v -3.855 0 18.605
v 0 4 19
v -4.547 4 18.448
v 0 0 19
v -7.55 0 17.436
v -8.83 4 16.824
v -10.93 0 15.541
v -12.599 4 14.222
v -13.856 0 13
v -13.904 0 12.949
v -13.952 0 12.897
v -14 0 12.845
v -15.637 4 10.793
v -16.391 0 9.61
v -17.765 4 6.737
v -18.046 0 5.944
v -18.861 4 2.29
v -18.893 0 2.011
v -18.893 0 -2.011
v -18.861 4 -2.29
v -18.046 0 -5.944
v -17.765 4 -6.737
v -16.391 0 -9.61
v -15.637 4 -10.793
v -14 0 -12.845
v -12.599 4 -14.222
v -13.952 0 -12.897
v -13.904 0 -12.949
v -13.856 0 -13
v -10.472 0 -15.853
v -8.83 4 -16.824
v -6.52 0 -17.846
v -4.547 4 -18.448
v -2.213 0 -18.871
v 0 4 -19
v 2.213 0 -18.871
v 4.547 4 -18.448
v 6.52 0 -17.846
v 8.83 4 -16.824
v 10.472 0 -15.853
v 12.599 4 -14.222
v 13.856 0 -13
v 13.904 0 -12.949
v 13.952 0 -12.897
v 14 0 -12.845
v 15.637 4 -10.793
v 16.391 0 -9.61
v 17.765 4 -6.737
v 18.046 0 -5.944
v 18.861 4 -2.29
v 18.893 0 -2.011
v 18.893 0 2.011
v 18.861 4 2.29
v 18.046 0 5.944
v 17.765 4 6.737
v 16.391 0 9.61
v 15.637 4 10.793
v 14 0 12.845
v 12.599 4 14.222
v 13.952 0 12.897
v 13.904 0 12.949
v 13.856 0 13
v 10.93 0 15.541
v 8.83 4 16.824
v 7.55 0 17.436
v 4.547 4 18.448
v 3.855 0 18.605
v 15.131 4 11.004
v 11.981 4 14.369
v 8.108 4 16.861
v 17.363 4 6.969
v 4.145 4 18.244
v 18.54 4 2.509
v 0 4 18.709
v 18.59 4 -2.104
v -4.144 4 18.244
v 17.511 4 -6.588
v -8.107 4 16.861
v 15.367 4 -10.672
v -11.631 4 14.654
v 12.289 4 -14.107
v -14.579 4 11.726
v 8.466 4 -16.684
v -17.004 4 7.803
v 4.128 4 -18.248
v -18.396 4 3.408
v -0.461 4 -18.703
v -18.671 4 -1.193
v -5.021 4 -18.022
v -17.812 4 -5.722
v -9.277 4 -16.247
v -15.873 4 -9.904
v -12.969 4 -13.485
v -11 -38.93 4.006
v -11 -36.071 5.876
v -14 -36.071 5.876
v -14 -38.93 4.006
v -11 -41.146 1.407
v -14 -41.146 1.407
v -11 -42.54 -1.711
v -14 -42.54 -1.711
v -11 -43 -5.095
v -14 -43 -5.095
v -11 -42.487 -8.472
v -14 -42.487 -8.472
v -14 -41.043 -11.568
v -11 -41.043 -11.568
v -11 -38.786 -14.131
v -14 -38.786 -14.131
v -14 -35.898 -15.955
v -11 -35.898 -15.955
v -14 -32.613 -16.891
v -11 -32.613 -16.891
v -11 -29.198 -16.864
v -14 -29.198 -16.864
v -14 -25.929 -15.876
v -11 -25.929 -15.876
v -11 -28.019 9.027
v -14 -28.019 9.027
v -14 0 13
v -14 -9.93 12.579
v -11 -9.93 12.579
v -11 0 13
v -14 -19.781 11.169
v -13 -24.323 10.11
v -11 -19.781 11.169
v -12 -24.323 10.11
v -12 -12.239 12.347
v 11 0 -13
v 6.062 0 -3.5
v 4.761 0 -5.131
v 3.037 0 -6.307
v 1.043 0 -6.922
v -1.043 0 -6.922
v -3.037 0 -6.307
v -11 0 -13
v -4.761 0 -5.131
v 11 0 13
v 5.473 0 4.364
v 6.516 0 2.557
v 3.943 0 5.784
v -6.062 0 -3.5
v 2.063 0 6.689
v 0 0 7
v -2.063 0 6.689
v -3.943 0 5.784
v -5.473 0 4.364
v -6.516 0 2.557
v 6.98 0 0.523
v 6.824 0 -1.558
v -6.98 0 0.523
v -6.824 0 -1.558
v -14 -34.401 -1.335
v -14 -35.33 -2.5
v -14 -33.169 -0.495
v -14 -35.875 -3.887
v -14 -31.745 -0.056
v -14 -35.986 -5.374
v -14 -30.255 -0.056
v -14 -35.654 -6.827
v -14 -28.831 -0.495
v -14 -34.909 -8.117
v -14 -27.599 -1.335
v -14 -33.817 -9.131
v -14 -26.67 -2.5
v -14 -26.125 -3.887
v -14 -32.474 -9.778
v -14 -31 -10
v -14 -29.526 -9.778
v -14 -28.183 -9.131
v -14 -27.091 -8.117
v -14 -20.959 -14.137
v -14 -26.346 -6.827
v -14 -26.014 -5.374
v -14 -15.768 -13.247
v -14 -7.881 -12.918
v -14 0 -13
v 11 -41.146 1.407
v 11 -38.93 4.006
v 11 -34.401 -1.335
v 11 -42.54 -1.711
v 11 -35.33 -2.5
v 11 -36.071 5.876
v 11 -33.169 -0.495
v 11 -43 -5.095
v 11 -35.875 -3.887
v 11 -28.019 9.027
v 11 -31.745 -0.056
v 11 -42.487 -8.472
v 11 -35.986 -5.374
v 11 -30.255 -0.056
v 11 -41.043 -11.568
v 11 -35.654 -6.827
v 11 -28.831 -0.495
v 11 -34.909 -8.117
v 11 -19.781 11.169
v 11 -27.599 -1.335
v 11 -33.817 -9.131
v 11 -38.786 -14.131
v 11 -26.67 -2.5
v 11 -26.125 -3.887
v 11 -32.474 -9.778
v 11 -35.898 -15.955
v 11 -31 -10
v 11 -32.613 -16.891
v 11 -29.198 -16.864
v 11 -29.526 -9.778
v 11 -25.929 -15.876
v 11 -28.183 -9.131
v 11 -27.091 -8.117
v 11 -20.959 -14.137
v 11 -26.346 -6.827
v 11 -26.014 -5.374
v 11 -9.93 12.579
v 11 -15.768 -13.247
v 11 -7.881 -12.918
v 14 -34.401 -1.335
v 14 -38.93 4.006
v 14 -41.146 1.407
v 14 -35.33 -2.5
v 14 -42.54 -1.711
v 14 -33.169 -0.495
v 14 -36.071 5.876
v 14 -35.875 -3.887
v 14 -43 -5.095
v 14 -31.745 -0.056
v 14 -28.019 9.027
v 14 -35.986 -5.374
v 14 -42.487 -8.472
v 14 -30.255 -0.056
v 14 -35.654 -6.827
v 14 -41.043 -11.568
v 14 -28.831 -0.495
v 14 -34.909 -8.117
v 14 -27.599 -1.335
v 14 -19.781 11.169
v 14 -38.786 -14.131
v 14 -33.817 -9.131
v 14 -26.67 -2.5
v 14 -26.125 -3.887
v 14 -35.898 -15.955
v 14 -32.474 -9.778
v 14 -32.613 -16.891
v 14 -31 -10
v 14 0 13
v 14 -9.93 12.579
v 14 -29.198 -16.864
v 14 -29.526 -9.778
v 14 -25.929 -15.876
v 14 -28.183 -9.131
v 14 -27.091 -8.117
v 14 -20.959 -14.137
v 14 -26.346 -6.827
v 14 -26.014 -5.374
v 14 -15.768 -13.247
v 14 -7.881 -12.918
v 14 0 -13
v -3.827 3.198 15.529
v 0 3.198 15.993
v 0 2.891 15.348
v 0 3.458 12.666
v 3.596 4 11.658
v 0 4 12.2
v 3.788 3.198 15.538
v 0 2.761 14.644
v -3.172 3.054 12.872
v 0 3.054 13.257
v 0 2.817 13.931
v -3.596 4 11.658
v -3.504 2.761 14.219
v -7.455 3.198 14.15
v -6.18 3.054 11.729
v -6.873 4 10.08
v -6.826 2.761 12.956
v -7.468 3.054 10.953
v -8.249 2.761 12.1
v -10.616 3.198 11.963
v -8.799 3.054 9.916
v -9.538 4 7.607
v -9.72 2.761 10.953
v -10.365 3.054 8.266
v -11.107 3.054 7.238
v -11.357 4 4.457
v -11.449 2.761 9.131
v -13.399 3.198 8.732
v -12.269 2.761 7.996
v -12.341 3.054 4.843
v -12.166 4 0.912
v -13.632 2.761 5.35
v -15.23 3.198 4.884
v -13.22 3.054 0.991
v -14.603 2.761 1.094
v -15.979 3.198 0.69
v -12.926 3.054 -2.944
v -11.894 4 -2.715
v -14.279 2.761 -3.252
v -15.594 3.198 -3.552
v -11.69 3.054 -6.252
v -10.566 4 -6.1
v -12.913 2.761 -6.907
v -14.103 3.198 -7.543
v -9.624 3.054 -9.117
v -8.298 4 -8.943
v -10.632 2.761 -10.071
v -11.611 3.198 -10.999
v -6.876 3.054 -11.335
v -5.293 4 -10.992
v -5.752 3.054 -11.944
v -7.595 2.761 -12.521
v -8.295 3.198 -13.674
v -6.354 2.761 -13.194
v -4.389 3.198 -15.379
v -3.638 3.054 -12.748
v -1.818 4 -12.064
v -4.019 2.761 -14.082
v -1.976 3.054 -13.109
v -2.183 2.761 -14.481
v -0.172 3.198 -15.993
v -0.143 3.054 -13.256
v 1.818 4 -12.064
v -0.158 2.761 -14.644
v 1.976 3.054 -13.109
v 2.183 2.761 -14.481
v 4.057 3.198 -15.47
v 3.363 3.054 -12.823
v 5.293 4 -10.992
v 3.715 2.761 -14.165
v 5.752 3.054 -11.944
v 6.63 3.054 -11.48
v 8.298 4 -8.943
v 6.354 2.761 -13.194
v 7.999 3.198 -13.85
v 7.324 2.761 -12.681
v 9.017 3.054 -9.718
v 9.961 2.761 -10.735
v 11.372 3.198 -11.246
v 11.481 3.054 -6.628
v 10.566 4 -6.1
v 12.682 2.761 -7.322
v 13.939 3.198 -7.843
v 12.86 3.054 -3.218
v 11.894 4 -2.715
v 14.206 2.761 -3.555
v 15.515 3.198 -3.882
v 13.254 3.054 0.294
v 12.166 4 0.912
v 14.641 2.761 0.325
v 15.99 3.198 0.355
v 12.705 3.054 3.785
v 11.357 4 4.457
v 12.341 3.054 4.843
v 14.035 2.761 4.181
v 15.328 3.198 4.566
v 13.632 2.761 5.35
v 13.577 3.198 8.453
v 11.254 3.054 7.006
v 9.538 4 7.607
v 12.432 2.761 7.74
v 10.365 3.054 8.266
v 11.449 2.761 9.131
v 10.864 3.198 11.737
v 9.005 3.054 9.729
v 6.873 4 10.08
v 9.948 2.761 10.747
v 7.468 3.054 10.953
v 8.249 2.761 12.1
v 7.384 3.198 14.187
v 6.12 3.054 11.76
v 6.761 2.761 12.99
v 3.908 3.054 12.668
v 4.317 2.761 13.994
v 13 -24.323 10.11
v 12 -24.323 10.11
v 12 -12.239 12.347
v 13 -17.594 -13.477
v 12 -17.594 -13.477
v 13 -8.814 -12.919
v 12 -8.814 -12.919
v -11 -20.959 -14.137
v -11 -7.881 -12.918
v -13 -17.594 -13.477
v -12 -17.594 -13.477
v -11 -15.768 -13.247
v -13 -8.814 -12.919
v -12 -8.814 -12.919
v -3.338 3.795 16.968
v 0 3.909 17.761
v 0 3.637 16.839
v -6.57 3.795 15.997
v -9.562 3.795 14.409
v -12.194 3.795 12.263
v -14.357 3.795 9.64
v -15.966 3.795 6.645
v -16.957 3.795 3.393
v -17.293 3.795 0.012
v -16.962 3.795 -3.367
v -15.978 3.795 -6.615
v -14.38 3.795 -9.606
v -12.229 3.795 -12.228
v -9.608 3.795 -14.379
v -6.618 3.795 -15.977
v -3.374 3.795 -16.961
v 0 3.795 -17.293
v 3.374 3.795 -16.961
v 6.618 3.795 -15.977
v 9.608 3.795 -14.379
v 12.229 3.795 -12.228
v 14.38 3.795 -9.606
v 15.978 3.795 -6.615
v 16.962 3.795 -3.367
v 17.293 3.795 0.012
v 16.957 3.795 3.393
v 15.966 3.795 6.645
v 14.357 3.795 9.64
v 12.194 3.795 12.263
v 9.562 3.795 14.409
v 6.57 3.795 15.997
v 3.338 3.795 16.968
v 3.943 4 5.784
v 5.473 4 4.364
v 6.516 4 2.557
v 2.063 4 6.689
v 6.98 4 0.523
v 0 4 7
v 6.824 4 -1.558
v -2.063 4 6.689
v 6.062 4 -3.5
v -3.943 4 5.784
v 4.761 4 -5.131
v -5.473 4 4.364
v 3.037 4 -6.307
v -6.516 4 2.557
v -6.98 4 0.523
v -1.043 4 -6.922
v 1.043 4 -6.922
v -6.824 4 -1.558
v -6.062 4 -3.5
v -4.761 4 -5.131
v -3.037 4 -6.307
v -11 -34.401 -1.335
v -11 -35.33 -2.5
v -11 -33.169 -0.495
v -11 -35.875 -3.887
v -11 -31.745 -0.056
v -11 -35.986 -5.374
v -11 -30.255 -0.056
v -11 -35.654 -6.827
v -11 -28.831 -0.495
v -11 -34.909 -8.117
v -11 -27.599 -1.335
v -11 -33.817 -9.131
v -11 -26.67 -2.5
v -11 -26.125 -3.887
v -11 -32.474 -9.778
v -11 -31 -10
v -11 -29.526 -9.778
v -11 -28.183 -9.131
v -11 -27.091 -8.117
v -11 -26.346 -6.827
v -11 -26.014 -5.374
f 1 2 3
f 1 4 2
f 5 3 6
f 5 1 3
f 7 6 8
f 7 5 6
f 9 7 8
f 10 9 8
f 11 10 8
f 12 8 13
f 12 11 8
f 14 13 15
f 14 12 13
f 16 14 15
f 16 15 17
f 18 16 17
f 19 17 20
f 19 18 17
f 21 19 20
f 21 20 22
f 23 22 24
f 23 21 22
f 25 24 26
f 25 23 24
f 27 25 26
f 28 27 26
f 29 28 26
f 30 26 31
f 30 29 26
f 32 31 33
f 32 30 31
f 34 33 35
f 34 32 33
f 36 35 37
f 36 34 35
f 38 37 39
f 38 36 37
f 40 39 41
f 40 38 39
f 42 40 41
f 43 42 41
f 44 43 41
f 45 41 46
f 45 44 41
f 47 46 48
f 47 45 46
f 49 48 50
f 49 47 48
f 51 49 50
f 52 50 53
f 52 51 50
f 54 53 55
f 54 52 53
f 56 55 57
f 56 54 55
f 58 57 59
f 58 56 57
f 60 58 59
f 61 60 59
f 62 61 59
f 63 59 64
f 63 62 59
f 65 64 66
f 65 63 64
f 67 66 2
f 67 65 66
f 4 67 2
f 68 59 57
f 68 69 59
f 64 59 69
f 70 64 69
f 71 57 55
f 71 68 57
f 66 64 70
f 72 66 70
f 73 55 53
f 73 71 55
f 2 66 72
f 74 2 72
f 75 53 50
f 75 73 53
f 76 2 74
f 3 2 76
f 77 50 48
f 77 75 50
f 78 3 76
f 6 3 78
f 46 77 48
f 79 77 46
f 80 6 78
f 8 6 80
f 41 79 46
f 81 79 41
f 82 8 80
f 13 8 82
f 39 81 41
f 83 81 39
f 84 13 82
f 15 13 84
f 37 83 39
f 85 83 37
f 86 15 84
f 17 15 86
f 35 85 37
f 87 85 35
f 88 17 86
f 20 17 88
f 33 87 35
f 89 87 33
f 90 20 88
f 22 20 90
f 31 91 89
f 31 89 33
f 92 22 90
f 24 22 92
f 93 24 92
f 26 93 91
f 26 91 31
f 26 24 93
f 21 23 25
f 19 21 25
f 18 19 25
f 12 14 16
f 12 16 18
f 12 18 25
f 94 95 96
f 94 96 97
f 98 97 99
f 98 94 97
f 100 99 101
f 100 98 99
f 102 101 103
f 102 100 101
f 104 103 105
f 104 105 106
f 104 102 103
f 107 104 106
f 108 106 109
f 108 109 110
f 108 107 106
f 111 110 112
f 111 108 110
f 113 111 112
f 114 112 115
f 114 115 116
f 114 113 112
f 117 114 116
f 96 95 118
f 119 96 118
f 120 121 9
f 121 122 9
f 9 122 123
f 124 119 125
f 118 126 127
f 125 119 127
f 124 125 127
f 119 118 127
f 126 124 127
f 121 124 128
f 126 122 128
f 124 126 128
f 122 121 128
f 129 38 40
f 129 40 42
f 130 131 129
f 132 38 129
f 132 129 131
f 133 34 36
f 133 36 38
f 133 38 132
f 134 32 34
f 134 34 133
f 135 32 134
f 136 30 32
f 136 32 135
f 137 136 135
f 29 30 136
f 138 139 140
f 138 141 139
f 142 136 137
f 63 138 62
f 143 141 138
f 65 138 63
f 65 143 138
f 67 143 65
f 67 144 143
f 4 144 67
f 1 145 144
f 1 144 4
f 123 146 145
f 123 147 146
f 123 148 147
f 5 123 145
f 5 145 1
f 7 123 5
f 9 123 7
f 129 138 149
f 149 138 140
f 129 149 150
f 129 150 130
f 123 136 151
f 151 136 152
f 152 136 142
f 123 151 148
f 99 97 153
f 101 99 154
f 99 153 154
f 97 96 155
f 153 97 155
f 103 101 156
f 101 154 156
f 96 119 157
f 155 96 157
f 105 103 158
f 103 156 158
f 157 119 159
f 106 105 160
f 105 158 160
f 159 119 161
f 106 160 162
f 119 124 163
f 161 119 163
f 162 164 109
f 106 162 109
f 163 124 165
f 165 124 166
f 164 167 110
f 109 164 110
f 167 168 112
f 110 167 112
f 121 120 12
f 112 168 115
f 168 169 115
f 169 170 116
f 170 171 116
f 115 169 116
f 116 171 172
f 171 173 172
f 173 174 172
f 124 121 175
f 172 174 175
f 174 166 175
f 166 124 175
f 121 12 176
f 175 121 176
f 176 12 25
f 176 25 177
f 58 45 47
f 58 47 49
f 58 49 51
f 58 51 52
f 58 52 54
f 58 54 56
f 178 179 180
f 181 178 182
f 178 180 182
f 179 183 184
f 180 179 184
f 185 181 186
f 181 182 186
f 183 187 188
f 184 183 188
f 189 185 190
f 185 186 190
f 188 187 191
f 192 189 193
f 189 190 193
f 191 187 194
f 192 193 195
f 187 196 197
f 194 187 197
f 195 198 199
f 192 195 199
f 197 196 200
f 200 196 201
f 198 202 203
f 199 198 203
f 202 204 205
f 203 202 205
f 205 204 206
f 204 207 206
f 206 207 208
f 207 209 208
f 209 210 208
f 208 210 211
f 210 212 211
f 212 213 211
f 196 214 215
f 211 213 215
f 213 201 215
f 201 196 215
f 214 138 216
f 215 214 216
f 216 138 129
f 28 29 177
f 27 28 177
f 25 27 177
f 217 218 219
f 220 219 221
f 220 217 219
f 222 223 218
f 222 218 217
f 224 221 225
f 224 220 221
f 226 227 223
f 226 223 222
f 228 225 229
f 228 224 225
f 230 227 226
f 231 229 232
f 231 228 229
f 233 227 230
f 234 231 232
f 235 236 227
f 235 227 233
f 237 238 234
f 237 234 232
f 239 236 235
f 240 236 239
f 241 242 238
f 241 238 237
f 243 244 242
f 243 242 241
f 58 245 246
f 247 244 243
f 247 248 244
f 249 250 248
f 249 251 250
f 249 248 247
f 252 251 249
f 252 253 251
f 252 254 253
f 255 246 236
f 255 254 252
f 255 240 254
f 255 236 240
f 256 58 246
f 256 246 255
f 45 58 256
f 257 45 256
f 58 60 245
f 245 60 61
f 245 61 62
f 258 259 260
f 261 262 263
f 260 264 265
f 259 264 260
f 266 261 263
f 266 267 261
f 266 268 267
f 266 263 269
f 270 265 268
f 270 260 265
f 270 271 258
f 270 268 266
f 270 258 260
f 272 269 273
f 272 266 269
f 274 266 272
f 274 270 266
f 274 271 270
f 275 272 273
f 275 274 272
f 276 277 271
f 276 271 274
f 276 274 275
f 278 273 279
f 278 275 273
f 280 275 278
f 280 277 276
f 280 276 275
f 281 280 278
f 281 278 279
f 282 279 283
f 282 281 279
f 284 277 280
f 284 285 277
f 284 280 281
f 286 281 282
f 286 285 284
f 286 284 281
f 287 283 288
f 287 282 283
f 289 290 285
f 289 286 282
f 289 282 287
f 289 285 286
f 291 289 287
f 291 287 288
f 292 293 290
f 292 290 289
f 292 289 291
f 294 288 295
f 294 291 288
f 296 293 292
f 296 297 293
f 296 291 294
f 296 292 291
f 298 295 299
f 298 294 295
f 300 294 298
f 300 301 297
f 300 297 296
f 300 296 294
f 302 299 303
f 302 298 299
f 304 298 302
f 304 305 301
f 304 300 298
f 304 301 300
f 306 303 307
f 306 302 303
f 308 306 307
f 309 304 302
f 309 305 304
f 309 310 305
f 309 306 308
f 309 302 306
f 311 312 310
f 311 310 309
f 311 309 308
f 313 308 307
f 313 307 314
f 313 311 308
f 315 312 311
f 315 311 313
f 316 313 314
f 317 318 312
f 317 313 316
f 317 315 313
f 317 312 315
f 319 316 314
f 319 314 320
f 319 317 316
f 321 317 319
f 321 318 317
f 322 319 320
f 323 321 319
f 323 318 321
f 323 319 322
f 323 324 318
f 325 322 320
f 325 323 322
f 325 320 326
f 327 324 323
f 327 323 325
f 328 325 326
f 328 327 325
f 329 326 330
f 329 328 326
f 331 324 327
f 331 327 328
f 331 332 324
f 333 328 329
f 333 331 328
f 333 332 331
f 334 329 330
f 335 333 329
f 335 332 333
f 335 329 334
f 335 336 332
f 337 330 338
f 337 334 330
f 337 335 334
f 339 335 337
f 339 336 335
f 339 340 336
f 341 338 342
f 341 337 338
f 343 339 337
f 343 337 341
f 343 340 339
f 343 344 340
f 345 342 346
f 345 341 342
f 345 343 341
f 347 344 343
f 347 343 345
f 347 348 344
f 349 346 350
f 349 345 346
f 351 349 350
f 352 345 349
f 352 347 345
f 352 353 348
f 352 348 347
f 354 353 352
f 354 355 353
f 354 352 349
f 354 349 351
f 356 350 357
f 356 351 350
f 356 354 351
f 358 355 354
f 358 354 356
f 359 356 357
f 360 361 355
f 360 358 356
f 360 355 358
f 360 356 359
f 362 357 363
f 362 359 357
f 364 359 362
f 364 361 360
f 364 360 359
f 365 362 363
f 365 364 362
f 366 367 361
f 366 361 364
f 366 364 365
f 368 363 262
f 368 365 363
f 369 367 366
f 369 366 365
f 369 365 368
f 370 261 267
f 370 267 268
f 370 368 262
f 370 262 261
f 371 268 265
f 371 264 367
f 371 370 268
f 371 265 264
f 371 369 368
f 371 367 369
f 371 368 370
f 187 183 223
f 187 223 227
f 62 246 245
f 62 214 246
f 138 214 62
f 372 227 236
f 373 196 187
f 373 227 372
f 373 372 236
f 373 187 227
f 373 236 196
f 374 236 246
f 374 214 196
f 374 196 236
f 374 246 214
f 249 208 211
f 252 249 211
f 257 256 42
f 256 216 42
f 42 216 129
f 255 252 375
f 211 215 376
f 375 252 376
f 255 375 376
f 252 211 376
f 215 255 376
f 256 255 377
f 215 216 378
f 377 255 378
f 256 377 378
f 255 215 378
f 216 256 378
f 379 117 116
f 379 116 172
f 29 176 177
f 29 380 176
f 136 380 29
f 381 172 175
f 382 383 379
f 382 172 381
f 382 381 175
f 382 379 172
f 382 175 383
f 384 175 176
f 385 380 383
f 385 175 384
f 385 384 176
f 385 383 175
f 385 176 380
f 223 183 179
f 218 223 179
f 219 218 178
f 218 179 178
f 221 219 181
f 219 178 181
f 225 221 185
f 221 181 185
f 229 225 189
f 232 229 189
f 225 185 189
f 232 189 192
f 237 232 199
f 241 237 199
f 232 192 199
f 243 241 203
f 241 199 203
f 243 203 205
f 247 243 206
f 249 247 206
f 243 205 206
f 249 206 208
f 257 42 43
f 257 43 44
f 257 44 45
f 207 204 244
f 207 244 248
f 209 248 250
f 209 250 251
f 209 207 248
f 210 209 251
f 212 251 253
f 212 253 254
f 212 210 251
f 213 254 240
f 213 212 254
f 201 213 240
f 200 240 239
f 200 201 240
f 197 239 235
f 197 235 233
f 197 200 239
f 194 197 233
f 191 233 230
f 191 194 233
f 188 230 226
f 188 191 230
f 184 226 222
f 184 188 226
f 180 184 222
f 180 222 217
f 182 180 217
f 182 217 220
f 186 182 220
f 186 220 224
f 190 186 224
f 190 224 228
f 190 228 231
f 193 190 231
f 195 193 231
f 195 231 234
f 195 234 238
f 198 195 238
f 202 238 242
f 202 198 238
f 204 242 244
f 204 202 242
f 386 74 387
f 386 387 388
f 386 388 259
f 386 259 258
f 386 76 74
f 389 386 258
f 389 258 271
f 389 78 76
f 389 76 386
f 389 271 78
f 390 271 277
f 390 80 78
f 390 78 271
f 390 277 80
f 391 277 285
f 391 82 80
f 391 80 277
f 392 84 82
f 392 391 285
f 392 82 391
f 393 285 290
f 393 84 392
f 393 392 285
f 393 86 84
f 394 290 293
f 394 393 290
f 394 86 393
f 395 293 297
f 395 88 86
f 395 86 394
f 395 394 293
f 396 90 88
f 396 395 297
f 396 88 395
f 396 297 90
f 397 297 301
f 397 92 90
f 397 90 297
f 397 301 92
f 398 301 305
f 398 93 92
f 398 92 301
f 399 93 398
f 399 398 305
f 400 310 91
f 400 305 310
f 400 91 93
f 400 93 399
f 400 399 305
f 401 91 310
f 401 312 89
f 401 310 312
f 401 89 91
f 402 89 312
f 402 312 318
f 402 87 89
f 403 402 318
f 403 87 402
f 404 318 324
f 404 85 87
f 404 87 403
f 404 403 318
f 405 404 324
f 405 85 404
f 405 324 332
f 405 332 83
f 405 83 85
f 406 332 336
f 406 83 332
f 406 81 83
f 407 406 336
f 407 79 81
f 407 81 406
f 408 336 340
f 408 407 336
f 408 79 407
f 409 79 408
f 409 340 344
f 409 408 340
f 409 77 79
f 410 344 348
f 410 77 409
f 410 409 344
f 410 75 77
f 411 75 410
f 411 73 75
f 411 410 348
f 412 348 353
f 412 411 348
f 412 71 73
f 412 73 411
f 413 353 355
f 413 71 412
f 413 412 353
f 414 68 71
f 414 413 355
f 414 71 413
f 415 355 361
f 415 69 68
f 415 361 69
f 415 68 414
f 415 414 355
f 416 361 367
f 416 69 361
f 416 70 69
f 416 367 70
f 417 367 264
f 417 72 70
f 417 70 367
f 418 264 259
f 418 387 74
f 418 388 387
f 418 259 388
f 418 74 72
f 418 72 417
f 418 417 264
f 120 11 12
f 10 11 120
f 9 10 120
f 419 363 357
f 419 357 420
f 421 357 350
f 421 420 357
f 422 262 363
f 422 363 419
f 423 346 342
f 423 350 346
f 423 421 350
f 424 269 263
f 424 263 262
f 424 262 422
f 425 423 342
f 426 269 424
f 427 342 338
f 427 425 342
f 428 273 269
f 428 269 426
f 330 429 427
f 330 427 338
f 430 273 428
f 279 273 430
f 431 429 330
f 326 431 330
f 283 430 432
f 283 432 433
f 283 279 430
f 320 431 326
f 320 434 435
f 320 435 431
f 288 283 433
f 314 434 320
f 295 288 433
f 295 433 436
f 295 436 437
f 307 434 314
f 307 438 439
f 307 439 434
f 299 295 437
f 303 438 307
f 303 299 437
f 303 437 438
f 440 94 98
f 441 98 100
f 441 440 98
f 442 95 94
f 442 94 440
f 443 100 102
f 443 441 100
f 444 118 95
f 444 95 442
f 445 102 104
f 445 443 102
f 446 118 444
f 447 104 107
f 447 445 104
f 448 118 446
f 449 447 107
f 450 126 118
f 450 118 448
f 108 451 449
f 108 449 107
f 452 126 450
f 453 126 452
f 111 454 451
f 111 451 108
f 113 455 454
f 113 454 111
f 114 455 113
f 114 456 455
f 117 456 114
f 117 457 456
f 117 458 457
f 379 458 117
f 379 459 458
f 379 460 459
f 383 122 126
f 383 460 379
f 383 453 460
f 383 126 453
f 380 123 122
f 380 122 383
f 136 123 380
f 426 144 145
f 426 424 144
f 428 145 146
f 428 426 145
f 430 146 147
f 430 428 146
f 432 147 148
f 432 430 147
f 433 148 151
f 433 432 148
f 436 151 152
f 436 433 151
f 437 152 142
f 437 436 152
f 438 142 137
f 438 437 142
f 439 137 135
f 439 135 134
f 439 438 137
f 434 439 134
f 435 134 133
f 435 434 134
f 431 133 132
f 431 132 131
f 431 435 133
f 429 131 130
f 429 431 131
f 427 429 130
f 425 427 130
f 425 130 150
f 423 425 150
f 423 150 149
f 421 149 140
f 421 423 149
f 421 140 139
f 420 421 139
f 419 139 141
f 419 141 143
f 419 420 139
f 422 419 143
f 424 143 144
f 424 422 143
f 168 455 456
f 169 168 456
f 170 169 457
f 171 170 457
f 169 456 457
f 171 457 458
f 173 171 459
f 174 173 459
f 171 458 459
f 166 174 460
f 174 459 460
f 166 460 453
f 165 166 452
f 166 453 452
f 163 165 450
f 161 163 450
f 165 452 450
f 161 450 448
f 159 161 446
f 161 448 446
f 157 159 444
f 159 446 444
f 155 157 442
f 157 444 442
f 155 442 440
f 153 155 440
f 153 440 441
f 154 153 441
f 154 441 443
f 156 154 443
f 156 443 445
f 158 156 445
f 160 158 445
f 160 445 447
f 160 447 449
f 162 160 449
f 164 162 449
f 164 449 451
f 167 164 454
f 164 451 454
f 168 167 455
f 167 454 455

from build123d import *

# Parameters (mm, degrees)
BOSS_EXTRUDE1_START = -11
SKETCH2_R           = 5
BOSS_EXTRUDE1_DEPTH = 3
FILLET1_R           = 5


with BuildPart() as part:
    # Sketch1 → Revolve1 (revolve)
    with BuildSketch(Plane.XY, mode=Mode.PRIVATE) as revolve1_sk:
        with BuildLine():
            Line((-16.8, 4), (-19, 4))
            Line((-19, 4), (-19, 0))
            Line((-19, 0), (-7, 0))
            Line((-7, 0), (-7, 4))
            Line((-7, 4), (-12.2, 4))
            ThreePointArc((-12.2, 4), (-14.5, 2.757481343), (-16.8, 4))
        make_face()
    revolve(revolve1_sk.sketch.rotate(Axis((0, 8.369163349, 0), (0, -1, 0)), 270), axis=Axis((0, 8.369163349, 0), (0, -1, 0)))

    # Sketch2 → Boss-Extrude1 (add)
    with BuildSketch(Plane(origin=(0, 0, 0), x_dir=(0, 0, -1), z_dir=(1, 0, 0)).offset(BOSS_EXTRUDE1_START)):
        with BuildLine():
            Line((13, 0), (-13, 0))
            add(Edge.make_bspline(
                [(-5.875693444, -36.071419141), (-11.248074258, -24.550311306), (-13, -12.25607796), (-13, 0)],
                knots=[0, 0, 0, 0, 1, 1, 1, 1], degree=3))
            ThreePointArc((-5.875693444, -36.071419141), (10.071419141, -41.875693444), (15.875693444, -25.928580859))
            add(Edge.make_bspline(
                [(15.875693444, -25.928580859), (12.156143996, -17.951981325), (13, -8.695854173), (13, 0)],
                knots=[0, 0, 0, 0, 1, 1, 1, 1], degree=3))
        make_face()
        with Locations((5, -31)):
            Circle(SKETCH2_R, mode=Mode.SUBTRACT)
    boss_extrude1 = extrude(amount=-BOSS_EXTRUDE1_DEPTH)

    # Mirror1: Boss-Extrude1 across plane
    add(boss_extrude1.mirror(Plane(origin=(0, 0, 0), x_dir=(0, 0, 1), z_dir=(1, 0, 0))))

    # Fillet1
    fillet1_edges = [part.edges().sort_by_distance(p)[0] for p in [
        (0, 4, -16.8),
    ]]
    fillet(fillet1_edges, radius=FILLET1_R)


solid = part.part
